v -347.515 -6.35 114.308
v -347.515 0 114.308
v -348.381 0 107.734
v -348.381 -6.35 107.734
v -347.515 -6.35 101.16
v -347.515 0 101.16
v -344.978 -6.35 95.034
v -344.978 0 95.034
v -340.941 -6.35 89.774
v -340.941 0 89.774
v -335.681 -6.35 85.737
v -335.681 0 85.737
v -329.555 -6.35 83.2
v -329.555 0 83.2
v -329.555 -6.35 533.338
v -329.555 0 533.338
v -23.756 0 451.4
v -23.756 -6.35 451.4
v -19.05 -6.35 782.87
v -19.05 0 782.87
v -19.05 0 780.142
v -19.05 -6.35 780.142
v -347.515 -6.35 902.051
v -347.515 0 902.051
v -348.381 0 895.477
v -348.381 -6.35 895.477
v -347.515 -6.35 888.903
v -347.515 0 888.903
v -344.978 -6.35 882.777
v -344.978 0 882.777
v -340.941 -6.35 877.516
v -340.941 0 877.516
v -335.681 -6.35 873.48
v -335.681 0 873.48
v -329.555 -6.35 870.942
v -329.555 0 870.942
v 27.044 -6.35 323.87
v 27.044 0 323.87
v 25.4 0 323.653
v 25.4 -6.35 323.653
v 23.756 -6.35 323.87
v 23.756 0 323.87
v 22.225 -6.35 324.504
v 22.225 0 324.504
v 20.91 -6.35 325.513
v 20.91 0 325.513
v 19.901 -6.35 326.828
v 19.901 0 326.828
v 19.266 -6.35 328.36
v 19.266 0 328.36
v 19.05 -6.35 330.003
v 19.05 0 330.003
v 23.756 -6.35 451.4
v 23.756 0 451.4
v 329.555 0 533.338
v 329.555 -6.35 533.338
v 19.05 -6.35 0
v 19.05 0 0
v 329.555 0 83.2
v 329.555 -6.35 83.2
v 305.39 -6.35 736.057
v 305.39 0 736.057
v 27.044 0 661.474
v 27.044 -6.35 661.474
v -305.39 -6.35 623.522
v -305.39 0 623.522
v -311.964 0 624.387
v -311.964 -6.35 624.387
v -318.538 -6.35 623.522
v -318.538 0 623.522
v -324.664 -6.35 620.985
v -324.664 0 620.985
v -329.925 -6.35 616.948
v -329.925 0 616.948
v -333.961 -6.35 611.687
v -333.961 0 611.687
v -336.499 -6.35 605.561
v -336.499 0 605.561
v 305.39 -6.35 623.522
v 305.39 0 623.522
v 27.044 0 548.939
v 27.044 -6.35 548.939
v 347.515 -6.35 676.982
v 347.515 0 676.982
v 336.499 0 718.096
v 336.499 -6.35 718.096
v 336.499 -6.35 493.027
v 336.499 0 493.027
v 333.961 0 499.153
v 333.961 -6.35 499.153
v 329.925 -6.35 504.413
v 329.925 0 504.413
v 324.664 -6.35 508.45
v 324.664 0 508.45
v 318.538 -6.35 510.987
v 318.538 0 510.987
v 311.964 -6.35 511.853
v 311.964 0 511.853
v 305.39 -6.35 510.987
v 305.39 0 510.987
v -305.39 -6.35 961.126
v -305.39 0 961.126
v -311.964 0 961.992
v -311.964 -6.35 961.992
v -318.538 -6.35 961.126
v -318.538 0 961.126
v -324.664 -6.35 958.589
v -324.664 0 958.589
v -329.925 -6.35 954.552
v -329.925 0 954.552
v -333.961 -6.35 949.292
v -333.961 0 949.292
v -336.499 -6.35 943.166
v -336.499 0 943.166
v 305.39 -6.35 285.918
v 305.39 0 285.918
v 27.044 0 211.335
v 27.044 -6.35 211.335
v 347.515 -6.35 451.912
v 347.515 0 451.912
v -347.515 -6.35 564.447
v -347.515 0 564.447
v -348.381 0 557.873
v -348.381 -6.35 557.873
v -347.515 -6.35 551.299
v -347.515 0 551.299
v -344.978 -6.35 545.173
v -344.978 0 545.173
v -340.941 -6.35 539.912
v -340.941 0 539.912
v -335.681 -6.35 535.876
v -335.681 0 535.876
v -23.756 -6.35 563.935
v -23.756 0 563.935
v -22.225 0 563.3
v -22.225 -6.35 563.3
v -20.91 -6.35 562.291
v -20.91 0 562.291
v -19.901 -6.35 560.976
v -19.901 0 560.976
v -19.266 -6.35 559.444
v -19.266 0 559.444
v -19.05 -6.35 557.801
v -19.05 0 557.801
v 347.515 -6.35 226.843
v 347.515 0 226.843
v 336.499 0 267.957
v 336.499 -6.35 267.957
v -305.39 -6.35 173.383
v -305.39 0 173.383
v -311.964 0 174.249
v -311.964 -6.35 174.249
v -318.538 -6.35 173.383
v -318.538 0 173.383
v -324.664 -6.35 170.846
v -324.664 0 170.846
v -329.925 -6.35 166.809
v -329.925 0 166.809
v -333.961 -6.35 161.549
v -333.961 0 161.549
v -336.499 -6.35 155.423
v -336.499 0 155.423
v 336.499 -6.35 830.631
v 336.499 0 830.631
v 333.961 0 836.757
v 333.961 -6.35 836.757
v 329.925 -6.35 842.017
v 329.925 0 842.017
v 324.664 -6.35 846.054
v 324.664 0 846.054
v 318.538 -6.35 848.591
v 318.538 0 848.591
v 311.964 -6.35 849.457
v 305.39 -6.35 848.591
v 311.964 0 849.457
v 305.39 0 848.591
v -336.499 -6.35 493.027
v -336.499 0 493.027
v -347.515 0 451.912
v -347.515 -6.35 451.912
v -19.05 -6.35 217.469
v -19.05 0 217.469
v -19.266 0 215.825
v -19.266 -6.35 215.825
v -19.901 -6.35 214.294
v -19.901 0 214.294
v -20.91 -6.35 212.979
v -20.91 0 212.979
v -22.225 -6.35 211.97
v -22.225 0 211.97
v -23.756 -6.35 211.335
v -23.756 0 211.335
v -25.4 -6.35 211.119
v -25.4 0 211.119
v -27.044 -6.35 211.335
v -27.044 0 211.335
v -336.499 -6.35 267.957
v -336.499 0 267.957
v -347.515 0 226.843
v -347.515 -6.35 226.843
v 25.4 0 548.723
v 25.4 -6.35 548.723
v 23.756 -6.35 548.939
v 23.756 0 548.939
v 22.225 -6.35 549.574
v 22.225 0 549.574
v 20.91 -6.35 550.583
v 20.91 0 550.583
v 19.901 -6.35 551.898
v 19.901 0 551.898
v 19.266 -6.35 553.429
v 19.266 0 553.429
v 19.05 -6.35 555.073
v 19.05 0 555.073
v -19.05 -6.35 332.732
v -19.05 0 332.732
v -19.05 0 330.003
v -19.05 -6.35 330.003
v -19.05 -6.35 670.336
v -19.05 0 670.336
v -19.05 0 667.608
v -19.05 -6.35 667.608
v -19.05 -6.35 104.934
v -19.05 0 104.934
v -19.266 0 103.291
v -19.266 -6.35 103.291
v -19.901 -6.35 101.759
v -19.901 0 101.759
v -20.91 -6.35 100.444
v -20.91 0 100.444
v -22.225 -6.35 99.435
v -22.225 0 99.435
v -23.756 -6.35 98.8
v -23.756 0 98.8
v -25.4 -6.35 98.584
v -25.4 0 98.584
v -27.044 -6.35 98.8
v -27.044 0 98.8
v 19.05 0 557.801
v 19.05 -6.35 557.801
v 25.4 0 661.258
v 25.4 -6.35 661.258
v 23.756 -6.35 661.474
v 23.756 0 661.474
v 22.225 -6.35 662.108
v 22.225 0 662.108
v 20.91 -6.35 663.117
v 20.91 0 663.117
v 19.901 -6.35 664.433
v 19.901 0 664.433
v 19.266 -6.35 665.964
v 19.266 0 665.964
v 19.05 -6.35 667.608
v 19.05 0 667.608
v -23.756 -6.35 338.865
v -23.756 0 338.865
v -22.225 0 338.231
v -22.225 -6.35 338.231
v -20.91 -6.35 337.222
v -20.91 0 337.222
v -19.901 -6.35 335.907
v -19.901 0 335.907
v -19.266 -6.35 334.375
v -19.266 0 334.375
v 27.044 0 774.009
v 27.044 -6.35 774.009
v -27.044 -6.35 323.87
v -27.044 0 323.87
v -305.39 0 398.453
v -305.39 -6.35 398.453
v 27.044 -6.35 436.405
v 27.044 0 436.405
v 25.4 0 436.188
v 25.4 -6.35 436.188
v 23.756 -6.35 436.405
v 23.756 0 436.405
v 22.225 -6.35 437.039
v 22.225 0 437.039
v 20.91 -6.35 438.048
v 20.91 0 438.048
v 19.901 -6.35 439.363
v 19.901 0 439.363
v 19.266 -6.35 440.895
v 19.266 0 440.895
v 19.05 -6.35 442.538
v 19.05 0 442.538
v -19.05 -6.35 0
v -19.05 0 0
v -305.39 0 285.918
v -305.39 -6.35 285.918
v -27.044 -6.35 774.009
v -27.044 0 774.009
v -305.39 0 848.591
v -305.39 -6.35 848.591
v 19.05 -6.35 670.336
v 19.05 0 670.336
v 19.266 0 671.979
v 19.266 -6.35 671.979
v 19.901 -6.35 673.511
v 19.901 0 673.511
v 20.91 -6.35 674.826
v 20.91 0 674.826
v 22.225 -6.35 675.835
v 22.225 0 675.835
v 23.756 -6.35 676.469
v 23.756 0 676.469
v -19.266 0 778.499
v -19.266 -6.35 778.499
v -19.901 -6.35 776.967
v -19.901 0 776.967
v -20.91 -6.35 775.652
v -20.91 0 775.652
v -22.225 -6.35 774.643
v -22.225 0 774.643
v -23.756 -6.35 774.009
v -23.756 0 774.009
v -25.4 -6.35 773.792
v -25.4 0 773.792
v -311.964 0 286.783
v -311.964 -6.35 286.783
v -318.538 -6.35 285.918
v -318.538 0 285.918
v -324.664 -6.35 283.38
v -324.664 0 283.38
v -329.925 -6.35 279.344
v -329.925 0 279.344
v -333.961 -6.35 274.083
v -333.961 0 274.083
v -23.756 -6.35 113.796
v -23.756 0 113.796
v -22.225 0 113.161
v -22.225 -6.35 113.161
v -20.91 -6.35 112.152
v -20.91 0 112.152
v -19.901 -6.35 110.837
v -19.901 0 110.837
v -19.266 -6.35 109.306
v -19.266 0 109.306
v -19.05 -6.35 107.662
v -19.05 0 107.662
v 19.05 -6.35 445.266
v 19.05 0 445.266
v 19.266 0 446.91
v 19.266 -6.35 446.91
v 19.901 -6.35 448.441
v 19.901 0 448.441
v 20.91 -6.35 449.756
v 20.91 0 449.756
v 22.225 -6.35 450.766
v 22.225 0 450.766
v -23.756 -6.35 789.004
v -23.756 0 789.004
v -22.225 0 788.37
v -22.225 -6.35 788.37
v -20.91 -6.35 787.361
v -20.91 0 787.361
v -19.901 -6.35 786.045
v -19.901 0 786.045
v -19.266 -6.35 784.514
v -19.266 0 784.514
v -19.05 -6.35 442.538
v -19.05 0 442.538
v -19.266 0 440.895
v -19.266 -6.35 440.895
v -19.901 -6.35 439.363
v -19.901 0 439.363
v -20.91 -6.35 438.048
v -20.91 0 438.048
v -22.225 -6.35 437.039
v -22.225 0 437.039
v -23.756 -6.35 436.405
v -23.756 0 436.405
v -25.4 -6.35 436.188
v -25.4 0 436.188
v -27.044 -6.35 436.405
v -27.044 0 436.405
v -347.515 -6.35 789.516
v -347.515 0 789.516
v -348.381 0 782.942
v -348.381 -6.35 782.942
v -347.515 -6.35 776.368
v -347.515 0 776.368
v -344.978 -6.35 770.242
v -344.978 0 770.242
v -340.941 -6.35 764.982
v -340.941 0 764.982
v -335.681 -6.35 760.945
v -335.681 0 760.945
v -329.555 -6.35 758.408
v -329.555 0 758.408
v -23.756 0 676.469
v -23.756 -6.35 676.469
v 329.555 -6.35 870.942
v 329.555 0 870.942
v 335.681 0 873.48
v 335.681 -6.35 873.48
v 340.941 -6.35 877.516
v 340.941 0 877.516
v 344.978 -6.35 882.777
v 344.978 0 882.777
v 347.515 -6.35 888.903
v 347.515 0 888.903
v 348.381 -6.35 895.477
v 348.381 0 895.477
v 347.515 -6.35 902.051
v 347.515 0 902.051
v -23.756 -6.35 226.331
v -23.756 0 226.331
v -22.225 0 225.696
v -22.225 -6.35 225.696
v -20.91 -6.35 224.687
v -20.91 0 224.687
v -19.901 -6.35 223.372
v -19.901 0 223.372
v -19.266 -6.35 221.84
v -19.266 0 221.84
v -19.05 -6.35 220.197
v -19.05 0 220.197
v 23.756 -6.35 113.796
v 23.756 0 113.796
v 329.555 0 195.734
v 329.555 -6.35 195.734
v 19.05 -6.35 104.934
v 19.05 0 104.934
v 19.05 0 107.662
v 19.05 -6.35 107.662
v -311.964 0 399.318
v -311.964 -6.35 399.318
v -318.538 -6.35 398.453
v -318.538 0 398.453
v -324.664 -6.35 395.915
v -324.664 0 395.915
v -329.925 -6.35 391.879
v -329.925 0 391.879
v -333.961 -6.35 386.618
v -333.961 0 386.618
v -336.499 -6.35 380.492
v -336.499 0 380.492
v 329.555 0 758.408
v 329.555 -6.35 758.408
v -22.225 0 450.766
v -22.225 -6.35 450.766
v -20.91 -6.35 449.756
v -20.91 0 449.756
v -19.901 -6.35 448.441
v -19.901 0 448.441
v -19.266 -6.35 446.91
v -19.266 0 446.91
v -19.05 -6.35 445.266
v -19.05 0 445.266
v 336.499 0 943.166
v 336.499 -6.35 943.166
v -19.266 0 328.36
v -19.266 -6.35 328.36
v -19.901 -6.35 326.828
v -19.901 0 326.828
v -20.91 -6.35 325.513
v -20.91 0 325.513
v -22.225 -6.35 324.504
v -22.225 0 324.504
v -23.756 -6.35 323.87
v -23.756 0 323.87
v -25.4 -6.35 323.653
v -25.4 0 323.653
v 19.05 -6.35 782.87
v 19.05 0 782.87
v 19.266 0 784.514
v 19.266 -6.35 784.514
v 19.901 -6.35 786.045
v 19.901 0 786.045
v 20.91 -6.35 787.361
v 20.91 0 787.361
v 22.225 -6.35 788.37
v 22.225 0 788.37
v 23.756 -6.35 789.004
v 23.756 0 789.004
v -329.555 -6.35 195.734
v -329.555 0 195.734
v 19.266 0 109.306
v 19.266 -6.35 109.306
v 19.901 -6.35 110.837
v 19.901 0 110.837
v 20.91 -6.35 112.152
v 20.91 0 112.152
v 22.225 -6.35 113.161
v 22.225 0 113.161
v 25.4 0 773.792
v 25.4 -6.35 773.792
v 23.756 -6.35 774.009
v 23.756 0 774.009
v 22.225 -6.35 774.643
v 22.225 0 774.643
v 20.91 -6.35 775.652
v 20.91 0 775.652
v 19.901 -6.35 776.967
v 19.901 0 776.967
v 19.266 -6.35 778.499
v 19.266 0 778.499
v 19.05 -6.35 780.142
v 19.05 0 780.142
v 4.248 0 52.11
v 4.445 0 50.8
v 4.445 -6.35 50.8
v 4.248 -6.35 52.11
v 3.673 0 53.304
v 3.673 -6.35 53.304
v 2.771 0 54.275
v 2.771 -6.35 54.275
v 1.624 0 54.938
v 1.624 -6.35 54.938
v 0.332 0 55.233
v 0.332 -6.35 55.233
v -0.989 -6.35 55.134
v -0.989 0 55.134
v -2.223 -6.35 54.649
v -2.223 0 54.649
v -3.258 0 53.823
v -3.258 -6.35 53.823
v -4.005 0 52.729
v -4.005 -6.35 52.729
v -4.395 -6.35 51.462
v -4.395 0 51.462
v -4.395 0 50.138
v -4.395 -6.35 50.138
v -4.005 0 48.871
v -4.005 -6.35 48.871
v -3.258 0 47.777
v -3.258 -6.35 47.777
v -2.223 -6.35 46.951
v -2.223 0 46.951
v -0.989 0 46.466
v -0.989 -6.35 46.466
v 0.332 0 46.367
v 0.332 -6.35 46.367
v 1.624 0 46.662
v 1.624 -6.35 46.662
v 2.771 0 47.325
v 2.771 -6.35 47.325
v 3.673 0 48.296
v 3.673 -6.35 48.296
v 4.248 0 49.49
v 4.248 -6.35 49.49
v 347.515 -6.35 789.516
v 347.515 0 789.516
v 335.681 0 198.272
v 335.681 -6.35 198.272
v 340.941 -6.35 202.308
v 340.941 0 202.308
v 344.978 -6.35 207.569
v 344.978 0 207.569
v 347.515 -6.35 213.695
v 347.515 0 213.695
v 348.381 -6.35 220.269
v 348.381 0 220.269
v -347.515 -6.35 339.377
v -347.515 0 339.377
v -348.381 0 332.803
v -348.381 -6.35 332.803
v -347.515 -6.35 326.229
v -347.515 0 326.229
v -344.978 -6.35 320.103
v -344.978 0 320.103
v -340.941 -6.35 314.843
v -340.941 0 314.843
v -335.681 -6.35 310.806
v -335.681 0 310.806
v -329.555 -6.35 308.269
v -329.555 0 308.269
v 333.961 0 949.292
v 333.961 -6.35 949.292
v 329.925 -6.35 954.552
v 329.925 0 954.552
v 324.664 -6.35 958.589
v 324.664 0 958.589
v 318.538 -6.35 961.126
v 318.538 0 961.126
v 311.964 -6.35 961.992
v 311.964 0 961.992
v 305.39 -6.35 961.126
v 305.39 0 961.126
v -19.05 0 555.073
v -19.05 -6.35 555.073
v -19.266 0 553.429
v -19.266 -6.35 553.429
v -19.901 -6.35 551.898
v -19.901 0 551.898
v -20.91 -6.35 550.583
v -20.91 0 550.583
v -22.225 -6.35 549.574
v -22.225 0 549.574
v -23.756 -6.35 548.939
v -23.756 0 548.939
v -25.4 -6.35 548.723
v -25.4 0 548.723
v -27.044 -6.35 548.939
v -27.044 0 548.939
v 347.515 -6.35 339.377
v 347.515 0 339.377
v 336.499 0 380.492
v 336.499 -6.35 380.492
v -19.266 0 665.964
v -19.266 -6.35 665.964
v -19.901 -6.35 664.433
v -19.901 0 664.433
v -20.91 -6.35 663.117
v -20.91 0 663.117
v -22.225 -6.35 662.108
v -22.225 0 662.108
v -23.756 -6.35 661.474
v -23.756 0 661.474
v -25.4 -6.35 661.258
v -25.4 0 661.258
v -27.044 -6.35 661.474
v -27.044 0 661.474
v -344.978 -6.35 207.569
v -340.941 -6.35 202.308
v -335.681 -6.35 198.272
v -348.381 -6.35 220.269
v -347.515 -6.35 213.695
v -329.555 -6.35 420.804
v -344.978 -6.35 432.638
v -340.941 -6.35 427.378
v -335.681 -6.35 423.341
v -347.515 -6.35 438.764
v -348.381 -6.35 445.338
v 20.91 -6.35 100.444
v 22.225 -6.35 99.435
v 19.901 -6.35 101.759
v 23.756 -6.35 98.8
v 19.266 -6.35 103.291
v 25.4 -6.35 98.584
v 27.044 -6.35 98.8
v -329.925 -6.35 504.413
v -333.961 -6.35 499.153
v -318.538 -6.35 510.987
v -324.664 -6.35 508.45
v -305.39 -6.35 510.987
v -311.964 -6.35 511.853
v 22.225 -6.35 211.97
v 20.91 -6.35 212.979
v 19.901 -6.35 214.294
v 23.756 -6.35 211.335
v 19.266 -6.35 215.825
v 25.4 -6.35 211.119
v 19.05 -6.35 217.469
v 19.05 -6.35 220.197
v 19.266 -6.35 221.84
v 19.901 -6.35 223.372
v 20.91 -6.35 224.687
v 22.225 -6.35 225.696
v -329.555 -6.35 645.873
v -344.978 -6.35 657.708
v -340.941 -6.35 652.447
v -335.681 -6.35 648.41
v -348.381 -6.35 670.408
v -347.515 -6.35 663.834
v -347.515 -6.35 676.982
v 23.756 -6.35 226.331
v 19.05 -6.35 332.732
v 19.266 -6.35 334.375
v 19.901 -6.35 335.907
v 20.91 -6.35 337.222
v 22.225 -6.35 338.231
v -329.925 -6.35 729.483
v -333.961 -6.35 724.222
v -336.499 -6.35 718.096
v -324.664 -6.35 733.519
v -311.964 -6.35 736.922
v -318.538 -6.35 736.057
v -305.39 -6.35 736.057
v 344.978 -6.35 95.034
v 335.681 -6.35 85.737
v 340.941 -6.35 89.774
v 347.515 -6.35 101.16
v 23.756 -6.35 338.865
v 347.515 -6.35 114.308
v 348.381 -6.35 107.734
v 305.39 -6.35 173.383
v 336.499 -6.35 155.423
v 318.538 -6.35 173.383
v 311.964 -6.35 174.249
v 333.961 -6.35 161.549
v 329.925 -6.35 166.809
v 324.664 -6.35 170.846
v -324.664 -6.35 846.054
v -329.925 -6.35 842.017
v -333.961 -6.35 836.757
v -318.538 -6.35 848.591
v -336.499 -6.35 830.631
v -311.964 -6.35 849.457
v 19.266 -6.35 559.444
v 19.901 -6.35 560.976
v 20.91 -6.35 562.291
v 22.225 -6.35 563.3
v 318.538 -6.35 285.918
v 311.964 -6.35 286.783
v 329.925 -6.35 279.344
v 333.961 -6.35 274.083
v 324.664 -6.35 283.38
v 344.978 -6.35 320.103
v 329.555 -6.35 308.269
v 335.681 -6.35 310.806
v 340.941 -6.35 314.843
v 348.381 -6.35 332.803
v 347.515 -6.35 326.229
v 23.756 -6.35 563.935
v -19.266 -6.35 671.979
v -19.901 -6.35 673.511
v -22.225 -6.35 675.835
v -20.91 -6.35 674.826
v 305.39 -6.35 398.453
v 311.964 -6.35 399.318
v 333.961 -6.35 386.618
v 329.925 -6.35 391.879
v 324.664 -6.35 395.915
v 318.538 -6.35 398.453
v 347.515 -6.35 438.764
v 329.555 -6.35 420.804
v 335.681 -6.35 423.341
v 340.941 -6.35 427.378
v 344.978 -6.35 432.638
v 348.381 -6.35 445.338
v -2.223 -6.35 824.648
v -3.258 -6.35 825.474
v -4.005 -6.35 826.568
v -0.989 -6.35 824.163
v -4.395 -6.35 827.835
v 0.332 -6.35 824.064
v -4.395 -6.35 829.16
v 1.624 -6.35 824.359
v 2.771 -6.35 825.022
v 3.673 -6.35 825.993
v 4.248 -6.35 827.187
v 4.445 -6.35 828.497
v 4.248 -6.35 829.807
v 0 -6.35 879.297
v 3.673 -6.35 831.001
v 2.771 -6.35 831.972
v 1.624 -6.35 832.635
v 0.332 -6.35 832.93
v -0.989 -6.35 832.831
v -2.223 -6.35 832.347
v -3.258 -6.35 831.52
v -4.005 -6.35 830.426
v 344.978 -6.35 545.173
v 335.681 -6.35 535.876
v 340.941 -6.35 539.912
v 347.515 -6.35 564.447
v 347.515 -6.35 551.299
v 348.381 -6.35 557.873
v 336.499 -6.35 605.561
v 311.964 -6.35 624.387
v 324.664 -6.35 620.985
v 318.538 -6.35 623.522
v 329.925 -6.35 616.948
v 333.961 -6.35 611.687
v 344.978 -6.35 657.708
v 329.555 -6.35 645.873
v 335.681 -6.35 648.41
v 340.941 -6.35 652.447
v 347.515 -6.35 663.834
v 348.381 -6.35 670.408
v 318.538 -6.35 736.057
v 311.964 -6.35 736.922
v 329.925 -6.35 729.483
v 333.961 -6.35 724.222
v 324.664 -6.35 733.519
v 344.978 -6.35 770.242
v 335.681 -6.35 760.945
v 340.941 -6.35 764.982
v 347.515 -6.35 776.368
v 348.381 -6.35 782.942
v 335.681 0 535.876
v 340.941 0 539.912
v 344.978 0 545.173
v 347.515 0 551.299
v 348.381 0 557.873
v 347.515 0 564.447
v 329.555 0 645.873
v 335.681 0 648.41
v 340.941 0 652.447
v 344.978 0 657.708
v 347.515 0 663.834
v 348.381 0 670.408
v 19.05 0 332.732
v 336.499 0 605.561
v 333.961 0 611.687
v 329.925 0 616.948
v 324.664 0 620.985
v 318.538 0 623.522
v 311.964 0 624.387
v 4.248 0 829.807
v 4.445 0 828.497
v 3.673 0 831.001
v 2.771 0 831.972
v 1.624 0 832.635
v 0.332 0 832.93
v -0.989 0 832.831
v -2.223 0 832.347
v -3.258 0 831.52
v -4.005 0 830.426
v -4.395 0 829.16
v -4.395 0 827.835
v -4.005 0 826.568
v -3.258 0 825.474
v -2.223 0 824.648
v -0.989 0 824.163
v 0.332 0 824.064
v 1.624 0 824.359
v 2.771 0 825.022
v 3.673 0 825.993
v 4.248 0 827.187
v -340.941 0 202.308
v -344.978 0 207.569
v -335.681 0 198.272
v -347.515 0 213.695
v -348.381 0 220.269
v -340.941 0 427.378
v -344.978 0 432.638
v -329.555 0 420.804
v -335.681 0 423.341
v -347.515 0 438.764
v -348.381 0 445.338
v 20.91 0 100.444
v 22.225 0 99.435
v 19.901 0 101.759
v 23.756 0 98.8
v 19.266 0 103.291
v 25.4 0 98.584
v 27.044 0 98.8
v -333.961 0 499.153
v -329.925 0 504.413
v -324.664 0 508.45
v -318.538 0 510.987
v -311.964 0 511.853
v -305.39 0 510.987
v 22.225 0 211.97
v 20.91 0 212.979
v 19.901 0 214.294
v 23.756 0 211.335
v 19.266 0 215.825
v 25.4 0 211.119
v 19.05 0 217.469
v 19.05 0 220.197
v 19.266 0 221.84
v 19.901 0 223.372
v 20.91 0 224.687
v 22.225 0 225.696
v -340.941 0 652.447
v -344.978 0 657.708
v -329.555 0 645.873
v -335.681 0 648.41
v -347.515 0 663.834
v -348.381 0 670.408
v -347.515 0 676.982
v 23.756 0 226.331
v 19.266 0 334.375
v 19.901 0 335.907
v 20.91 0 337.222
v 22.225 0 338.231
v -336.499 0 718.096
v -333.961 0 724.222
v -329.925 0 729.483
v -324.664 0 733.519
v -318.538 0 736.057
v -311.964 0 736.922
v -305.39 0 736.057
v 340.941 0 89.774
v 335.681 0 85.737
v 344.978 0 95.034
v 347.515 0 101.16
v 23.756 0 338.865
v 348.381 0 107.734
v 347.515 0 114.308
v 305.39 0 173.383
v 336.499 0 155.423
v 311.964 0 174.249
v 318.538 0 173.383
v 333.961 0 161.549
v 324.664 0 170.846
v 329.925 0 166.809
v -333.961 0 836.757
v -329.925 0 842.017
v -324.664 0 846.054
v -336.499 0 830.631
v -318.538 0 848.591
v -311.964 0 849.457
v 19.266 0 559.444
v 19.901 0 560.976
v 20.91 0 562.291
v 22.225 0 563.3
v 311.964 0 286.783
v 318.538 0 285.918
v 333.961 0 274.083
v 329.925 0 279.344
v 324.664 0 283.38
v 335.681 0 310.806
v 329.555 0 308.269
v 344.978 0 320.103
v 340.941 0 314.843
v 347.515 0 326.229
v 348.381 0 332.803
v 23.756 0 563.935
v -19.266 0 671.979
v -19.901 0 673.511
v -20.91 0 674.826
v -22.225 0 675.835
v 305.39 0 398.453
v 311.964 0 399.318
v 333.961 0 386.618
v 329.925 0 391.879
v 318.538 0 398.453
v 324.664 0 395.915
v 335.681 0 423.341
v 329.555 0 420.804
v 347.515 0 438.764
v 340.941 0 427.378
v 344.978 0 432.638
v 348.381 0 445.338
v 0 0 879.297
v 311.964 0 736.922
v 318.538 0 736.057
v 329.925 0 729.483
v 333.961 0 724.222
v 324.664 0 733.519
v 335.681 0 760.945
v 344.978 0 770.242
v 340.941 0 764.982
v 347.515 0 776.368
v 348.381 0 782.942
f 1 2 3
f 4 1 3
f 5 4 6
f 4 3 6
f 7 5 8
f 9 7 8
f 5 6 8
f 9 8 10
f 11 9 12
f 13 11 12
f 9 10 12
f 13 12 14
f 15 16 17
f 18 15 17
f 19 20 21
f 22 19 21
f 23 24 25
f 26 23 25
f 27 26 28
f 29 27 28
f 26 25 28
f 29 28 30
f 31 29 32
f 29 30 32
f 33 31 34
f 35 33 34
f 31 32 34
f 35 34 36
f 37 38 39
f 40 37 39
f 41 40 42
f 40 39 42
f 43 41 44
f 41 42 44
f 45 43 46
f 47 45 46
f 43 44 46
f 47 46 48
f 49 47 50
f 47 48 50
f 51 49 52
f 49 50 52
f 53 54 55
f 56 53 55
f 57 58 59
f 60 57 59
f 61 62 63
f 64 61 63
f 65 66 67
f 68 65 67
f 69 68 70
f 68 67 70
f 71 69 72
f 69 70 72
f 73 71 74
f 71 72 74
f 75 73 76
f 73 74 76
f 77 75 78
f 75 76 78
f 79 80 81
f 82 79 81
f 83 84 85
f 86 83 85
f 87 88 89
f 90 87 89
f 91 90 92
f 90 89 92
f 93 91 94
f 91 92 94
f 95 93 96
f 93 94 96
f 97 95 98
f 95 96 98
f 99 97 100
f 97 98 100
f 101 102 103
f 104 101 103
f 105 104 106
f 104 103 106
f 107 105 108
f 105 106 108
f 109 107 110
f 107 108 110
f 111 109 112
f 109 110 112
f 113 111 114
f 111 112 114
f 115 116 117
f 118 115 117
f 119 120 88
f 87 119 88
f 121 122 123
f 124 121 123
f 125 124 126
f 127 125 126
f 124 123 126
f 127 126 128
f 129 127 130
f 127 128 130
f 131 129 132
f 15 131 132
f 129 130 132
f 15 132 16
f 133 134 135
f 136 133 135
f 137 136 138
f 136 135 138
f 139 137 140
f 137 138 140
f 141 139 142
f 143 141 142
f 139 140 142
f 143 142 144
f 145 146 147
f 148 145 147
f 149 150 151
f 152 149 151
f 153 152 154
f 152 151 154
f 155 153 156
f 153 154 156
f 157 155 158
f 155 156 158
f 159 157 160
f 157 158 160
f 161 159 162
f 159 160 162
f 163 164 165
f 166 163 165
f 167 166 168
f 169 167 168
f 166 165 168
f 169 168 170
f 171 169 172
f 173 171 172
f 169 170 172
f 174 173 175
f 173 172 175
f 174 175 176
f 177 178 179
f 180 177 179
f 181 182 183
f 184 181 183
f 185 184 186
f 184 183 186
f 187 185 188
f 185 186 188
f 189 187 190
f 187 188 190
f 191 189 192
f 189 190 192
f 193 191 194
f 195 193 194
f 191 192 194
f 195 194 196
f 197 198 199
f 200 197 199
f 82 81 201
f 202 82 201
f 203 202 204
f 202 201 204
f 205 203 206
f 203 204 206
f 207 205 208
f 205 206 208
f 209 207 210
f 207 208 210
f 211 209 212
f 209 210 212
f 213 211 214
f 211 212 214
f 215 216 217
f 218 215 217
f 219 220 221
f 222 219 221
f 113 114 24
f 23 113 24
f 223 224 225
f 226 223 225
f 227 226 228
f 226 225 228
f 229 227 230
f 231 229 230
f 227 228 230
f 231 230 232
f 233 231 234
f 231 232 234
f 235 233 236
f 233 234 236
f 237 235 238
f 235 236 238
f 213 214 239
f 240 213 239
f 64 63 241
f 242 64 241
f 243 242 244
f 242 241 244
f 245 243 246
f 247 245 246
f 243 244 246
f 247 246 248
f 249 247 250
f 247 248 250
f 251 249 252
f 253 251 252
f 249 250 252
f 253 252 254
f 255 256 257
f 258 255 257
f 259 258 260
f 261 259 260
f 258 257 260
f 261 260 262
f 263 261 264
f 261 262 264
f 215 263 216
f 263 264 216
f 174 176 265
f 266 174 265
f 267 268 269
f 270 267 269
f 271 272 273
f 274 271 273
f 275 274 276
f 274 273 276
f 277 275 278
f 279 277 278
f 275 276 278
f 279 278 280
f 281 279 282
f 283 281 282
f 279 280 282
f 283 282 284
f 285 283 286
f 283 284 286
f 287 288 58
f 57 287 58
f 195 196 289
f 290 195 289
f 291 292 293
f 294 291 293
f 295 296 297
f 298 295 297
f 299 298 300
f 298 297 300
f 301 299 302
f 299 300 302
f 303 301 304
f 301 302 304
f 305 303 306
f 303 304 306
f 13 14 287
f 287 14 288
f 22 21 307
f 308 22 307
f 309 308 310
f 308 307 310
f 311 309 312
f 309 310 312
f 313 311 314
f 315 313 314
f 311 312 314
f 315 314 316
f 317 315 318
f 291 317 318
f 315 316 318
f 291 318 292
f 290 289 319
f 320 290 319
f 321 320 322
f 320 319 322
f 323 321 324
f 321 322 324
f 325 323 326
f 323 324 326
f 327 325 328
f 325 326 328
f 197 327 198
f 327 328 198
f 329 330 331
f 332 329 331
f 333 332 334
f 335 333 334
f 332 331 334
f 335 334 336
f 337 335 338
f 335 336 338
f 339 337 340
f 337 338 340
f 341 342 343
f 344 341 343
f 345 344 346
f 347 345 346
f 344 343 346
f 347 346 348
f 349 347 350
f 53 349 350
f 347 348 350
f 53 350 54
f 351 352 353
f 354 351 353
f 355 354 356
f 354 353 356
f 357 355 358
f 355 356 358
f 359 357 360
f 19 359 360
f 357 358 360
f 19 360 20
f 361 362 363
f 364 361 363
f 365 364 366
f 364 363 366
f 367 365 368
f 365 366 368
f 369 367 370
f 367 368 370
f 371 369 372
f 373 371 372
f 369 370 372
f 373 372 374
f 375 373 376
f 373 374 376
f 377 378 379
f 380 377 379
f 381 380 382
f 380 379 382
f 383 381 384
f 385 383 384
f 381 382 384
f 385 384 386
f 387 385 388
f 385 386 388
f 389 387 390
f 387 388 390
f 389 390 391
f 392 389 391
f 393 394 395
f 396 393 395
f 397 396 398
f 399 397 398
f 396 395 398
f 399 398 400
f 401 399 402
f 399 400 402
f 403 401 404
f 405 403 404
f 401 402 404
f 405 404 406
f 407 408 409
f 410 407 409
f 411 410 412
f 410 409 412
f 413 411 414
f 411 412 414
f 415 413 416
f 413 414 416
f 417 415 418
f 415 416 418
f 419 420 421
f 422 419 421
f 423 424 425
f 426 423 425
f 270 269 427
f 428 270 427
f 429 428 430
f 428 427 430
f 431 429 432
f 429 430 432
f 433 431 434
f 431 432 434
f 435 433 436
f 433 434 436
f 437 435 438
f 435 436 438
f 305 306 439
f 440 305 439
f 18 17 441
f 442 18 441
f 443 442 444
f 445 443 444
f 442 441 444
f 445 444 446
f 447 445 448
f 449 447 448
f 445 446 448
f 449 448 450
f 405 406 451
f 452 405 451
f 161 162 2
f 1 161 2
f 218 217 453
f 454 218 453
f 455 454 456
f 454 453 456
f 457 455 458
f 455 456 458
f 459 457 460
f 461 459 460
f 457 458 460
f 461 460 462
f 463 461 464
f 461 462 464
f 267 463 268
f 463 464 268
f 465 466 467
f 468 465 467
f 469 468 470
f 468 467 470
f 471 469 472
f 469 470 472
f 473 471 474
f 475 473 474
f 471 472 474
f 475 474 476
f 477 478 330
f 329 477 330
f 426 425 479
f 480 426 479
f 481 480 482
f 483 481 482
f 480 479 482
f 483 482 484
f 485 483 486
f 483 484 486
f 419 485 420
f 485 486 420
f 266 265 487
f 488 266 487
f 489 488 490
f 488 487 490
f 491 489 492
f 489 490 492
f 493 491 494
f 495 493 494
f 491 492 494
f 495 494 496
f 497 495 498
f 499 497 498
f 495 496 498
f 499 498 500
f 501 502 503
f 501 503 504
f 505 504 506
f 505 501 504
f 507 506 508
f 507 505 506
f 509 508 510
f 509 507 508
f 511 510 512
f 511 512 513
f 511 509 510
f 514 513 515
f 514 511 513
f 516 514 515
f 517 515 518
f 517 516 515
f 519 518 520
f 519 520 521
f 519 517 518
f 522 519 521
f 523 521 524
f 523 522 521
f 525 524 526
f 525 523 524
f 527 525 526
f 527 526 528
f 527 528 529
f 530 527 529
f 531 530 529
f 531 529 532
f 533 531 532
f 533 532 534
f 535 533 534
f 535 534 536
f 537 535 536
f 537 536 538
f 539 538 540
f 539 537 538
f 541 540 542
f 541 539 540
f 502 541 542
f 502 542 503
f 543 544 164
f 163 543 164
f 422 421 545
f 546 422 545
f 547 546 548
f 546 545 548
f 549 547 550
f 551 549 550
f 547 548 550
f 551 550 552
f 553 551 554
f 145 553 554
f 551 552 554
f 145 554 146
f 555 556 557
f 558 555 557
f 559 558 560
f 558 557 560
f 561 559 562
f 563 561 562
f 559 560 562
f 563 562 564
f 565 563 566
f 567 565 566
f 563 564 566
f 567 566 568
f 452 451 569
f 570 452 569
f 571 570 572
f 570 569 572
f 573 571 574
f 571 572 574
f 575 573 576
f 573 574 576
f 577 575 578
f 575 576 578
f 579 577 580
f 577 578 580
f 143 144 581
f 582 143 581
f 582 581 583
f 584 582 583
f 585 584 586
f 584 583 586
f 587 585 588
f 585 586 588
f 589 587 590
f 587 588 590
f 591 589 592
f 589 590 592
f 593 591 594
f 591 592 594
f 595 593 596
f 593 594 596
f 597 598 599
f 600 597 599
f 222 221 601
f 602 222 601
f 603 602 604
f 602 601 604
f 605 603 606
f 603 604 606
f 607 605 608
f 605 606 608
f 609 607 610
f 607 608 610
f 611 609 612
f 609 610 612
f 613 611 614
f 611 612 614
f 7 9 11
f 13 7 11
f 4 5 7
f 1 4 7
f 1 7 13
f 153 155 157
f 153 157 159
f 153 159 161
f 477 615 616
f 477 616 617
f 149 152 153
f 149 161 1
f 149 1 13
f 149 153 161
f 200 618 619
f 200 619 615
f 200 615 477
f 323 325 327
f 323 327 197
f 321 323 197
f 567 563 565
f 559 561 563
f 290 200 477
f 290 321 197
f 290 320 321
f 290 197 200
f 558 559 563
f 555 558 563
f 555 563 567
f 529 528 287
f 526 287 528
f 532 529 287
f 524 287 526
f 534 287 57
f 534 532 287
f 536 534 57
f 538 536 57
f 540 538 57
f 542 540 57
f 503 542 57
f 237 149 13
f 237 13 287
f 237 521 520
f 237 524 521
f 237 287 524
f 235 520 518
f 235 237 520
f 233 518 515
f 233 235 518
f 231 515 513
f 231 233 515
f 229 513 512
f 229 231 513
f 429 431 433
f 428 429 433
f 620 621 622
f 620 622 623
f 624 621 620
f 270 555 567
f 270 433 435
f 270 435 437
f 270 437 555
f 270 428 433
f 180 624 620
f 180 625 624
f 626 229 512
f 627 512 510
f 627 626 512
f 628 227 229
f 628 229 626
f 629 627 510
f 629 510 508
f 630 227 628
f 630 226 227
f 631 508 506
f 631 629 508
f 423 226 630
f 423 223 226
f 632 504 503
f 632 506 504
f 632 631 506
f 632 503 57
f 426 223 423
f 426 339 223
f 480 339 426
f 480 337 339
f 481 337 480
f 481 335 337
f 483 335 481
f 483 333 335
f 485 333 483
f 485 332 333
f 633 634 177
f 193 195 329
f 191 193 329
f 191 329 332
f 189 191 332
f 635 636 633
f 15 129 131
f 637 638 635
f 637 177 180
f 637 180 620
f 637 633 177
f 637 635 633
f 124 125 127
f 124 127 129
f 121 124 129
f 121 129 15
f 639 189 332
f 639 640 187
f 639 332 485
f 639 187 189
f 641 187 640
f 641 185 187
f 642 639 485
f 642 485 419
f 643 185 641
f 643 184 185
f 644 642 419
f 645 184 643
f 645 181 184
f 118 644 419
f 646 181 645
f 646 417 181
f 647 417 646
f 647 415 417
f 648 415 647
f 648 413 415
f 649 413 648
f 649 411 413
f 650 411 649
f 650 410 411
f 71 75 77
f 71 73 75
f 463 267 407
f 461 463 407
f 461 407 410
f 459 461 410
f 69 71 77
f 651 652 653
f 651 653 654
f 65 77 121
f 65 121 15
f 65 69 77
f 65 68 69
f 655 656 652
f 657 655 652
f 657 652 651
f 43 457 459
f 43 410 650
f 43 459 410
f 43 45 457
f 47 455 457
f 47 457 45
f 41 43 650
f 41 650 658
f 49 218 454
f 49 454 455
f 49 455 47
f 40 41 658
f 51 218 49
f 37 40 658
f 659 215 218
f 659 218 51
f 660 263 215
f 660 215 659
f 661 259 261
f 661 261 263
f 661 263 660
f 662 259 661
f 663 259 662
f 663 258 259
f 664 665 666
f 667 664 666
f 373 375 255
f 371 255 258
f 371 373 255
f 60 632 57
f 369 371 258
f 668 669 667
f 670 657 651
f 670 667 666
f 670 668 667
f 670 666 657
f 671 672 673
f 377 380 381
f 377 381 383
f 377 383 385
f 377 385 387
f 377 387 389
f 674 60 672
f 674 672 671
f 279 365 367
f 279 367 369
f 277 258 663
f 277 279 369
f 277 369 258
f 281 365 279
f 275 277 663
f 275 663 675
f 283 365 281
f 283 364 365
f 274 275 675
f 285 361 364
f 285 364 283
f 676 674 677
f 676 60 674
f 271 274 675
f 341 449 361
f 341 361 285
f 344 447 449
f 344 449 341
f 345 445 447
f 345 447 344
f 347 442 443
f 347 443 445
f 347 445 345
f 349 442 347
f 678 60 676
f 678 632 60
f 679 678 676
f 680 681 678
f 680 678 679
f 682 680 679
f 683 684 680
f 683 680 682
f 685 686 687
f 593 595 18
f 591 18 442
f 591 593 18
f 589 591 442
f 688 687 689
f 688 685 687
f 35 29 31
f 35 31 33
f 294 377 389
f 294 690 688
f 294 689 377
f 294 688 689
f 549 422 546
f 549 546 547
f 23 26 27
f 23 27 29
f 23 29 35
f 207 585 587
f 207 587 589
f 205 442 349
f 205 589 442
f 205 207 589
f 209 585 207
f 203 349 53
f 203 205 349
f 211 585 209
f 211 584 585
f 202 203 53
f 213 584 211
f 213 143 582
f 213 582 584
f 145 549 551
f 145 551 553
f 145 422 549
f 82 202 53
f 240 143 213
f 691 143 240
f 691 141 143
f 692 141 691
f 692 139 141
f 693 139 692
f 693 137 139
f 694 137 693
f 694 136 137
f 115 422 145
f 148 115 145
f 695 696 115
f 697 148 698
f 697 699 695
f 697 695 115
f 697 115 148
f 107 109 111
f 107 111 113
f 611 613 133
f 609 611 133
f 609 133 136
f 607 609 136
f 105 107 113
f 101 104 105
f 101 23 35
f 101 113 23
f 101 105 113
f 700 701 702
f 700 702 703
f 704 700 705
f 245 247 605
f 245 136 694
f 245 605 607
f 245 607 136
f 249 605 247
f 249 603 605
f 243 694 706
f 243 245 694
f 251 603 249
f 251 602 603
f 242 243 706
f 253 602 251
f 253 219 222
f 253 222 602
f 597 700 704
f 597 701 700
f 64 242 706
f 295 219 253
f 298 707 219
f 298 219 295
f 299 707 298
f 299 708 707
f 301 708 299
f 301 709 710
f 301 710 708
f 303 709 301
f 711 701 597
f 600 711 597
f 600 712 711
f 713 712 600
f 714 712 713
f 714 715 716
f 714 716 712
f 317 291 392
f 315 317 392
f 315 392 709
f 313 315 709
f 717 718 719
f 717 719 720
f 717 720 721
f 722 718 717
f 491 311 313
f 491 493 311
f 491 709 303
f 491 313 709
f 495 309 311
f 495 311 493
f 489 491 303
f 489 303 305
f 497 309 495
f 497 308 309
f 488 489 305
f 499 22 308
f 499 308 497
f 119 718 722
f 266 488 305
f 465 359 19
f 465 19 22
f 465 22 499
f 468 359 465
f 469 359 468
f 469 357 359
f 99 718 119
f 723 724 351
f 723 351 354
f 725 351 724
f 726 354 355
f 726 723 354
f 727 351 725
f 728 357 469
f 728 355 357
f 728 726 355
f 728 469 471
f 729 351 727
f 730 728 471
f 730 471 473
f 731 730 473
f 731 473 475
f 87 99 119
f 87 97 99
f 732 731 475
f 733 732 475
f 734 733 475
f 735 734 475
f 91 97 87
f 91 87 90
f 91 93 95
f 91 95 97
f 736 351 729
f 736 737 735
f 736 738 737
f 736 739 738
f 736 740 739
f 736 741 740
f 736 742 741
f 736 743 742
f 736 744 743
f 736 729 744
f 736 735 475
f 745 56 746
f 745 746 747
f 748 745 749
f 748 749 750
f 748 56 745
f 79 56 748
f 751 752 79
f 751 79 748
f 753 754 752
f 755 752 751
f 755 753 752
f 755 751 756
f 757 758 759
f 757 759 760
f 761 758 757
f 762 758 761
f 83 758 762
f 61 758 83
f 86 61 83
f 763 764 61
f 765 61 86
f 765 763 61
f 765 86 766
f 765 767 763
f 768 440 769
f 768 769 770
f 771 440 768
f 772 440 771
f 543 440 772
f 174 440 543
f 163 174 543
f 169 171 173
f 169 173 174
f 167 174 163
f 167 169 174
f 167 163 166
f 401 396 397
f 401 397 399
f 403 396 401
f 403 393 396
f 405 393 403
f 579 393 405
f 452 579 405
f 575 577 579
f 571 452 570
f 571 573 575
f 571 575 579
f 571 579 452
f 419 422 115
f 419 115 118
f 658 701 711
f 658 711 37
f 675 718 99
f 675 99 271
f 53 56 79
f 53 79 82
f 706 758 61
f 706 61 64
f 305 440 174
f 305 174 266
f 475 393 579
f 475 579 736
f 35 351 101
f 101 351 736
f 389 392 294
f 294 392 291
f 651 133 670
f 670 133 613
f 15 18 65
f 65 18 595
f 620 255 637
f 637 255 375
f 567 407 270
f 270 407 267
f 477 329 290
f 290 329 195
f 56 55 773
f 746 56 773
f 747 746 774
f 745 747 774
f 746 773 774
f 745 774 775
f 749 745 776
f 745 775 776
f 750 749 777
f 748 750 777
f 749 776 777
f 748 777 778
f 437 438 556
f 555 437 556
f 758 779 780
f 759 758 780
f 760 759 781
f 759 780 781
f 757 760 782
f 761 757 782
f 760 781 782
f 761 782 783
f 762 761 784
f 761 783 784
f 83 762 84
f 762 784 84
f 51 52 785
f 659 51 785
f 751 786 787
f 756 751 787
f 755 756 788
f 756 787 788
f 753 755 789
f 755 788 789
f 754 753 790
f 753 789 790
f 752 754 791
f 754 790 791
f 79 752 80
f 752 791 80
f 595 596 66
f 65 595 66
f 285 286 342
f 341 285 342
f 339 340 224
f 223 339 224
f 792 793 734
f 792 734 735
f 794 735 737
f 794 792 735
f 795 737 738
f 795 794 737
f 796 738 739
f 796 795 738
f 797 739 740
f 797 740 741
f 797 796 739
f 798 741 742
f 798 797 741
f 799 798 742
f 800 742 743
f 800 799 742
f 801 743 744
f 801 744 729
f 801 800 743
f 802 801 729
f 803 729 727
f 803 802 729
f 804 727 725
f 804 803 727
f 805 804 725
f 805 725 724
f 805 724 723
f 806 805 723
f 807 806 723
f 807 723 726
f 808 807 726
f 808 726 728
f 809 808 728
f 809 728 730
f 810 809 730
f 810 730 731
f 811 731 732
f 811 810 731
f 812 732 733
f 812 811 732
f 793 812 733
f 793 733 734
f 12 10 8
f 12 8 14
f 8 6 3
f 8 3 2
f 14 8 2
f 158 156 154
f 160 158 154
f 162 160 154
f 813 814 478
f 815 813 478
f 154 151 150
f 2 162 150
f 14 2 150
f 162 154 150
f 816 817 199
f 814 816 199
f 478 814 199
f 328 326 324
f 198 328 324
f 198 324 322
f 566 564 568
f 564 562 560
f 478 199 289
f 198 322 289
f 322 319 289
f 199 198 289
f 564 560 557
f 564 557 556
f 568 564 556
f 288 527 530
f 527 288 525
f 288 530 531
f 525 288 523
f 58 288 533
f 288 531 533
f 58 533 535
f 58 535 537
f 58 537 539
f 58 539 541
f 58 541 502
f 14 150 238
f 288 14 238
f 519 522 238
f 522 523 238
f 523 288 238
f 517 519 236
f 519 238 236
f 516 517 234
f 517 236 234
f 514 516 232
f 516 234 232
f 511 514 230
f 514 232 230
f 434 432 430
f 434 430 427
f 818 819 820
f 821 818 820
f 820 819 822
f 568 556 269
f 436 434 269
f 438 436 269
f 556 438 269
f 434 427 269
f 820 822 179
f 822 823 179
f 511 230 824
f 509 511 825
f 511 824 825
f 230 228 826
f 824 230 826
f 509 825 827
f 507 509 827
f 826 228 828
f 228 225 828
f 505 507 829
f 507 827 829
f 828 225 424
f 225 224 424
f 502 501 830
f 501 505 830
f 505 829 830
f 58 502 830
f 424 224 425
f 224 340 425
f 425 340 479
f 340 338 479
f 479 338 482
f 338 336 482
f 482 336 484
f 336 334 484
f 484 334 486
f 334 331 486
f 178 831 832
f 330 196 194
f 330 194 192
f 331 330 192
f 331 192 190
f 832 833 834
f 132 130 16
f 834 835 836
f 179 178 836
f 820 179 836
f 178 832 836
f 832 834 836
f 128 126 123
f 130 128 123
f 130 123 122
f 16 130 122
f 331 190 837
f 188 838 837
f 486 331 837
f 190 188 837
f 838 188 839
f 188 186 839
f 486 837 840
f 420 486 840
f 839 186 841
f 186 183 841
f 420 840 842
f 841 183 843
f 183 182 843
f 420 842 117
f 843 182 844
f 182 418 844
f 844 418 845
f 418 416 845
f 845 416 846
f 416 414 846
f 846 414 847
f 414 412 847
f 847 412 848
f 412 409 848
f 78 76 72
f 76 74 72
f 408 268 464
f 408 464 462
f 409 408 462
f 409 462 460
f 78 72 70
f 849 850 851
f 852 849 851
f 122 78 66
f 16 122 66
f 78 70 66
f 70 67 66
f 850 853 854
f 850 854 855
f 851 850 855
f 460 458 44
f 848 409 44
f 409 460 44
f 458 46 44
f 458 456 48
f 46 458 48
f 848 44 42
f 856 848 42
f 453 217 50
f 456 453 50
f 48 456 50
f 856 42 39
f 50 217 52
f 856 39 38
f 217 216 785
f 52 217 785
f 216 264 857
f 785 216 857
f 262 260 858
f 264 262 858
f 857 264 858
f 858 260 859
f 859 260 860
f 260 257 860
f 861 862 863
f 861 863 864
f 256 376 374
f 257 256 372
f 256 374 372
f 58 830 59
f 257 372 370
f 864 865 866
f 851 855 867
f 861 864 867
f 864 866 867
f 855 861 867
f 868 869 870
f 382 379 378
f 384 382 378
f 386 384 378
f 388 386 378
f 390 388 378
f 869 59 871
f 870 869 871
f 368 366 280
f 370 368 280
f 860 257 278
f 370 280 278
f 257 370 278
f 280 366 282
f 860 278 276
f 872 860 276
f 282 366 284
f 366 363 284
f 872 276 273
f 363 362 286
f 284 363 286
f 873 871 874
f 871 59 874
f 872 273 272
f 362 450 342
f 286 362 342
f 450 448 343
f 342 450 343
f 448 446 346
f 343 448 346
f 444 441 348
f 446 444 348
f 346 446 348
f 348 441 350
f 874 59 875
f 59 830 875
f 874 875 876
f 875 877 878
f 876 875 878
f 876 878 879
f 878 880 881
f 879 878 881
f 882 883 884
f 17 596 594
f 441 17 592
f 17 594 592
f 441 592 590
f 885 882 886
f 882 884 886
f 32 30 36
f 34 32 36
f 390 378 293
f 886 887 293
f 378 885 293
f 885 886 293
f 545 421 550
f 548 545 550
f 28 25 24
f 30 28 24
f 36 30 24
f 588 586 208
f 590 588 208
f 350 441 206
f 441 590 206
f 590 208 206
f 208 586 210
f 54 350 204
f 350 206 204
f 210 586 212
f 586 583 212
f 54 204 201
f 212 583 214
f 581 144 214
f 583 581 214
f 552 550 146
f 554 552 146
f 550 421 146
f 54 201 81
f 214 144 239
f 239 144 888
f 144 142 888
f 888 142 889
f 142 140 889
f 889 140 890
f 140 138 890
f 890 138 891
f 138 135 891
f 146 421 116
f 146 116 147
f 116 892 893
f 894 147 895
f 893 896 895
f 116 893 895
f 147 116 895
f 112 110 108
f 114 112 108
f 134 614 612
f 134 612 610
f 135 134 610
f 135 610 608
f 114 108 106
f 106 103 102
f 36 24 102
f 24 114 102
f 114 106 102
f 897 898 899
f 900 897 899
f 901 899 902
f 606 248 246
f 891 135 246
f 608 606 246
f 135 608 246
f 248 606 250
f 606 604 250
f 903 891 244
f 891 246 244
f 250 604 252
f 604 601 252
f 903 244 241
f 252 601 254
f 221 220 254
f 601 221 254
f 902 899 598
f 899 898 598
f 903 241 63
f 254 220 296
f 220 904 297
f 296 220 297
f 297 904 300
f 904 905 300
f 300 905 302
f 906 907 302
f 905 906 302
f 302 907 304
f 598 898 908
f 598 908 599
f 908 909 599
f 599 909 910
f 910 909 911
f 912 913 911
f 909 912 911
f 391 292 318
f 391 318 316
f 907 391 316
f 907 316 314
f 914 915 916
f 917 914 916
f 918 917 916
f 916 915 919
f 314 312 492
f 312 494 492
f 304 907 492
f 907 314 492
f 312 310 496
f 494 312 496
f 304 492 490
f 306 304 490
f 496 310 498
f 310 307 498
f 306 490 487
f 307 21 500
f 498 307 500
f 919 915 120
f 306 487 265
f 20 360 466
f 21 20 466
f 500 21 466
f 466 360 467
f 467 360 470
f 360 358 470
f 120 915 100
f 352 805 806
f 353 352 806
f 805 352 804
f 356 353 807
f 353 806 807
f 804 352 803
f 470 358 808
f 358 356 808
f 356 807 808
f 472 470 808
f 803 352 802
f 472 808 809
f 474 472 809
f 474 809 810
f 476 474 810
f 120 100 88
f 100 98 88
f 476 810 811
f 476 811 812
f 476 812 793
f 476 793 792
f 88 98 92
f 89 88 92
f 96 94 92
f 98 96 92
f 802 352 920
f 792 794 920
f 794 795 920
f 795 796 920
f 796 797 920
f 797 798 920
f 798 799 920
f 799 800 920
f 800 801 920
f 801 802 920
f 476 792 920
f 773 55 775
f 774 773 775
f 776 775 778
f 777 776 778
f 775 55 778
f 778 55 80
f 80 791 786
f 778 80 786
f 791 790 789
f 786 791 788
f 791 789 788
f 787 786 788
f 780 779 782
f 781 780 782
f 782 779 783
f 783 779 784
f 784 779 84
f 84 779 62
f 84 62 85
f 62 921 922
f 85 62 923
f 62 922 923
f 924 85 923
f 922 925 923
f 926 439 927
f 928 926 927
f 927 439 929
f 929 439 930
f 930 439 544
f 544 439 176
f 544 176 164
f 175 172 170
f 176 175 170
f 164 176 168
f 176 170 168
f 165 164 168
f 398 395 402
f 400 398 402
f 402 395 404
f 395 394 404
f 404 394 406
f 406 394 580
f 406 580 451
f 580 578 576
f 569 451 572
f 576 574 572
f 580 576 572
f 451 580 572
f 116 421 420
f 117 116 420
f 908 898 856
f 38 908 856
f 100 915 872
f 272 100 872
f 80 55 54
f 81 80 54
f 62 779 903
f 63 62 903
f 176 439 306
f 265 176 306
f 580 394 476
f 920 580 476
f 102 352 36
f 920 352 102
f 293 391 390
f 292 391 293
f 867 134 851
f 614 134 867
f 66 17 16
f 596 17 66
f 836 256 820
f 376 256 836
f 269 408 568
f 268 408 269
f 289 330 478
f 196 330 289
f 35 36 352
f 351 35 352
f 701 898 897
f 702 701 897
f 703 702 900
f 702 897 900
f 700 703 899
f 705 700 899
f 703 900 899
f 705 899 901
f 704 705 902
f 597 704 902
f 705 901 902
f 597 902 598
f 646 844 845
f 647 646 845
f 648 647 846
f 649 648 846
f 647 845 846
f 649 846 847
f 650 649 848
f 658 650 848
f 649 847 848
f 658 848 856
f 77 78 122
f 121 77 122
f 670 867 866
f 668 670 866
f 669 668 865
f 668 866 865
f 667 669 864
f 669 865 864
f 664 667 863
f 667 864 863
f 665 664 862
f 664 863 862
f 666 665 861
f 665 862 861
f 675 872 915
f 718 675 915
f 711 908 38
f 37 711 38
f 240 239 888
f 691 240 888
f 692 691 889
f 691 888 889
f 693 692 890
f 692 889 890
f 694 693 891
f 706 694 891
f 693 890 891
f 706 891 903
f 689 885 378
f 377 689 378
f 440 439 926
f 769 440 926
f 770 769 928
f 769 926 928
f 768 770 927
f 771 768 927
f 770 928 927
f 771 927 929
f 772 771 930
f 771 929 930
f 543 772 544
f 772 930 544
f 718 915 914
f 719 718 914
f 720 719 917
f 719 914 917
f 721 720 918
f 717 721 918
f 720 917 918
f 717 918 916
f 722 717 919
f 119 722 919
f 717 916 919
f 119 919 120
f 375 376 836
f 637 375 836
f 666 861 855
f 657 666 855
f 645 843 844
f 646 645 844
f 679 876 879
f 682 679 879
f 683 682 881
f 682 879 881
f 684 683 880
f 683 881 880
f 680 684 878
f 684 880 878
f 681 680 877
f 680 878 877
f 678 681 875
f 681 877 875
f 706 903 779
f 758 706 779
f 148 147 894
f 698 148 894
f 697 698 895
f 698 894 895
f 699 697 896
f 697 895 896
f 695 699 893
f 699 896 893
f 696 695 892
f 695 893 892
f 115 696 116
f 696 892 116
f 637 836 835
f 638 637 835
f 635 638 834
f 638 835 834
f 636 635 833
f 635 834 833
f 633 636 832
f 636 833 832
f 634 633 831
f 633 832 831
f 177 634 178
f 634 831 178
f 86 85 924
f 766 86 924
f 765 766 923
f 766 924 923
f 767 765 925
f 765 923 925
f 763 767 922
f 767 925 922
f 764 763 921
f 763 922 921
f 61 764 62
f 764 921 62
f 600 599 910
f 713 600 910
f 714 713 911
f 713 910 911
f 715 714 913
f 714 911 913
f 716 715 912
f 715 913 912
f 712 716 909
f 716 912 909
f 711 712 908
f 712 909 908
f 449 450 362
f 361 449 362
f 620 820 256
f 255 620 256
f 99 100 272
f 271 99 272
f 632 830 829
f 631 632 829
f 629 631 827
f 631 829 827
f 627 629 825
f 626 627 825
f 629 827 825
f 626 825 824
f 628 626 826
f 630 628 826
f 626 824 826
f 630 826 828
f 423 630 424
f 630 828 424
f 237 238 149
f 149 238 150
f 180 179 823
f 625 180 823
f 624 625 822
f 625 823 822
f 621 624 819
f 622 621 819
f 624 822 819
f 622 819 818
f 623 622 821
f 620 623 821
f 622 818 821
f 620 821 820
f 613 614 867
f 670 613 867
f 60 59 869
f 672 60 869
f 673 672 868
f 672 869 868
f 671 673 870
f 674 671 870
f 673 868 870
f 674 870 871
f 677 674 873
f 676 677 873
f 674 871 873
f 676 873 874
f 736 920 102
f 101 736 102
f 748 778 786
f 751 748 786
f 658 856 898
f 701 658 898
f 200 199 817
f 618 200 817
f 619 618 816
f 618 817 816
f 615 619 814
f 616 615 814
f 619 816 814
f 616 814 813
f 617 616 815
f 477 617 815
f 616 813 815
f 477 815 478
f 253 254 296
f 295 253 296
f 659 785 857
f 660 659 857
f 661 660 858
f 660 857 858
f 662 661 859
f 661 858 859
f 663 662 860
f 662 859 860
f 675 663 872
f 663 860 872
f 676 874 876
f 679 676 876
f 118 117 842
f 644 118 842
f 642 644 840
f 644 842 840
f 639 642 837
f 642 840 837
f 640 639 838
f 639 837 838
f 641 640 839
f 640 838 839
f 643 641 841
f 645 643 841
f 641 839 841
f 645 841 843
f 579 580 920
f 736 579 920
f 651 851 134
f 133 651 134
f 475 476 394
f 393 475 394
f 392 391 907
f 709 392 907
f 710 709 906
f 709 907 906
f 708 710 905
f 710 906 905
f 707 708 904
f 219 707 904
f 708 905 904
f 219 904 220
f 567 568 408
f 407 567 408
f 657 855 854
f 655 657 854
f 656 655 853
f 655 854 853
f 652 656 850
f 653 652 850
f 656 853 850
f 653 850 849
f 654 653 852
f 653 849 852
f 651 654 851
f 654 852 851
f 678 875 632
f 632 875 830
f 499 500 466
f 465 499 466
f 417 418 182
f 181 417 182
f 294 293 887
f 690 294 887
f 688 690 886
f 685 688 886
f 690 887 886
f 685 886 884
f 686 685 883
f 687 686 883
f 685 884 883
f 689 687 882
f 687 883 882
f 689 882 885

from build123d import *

# Parameters (mm, degrees)
F0_R     = 4.445
F1_DEPTH = 6.35


with BuildPart() as f1:
    # F0 (on Front) → F1 (new body)
    with BuildSketch(Plane.XZ):
        with BuildLine():
            Line((-19.05, 0), (0, 0))
            Line((0, 0), (19.05, 0))
            Line((19.05, 0), (329.55476, 83.1995))
            ThreePointArc((329.55476, 83.1995), (344.977801, 95.034016), (347.515272, 114.308019))
            Line((347.515272, 114.308019), (336.498634, 155.422674))
            ThreePointArc((336.498634, 155.422674), (324.664118, 170.845716), (305.390114, 173.383186))
            Line((305.390114, 173.383186), (27.043501, 98.800436))
            ThreePointArc((27.043501, 98.800436), (21.534365, 99.896271), (19.05, 104.934065))
            Line((19.05, 104.934065), (19.05, 107.662174))
            ThreePointArc((19.05, 107.662174), (20.362206, 111.527809), (23.756499, 113.795803))
            Line((23.756499, 113.795803), (329.55476, 195.7342))
            ThreePointArc((329.55476, 195.7342), (344.977801, 207.568716), (347.515272, 226.842719))
            Line((347.515272, 226.842719), (336.498634, 267.957374))
            ThreePointArc((336.498634, 267.957374), (324.664118, 283.380416), (305.390114, 285.917886))
            Line((305.390114, 285.917886), (27.043501, 211.335136))
            ThreePointArc((27.043501, 211.335136), (21.534365, 212.430971), (19.05, 217.468765))
            Line((19.05, 217.468765), (19.05, 220.196874))
            ThreePointArc((19.05, 220.196874), (20.362206, 224.062509), (23.756499, 226.330503))
            Line((23.756499, 226.330503), (329.55476, 308.2689))
            ThreePointArc((329.55476, 308.2689), (344.977801, 320.103416), (347.515272, 339.377419))
            Line((347.515272, 339.377419), (336.498634, 380.492074))
            ThreePointArc((336.498634, 380.492074), (324.664118, 395.915116), (305.390114, 398.452586))
            Line((305.390114, 398.452586), (27.043501, 323.869836))
            ThreePointArc((27.043501, 323.869836), (21.534365, 324.965671), (19.05, 330.003465))
            Line((19.05, 330.003465), (19.05, 332.731574))
            ThreePointArc((19.05, 332.731574), (20.362206, 336.597209), (23.756499, 338.865203))
            Line((23.756499, 338.865203), (329.55476, 420.8036))
            ThreePointArc((329.55476, 420.8036), (344.977801, 432.638116), (347.515272, 451.912119))
            Line((347.515272, 451.912119), (336.498634, 493.026774))
            ThreePointArc((336.498634, 493.026774), (324.664118, 508.449816), (305.390114, 510.987286))
            Line((305.390114, 510.987286), (27.043501, 436.404536))
            ThreePointArc((27.043501, 436.404536), (21.534365, 437.500371), (19.05, 442.538165))
            Line((19.05, 442.538165), (19.05, 445.266274))
            ThreePointArc((19.05, 445.266274), (20.362206, 449.131909), (23.756499, 451.399903))
            Line((23.756499, 451.399903), (329.55476, 533.3383))
            ThreePointArc((329.55476, 533.3383), (344.977801, 545.172816), (347.515272, 564.446819))
            Line((347.515272, 564.446819), (336.498634, 605.561474))
            ThreePointArc((336.498634, 605.561474), (324.664118, 620.984516), (305.390114, 623.521986))
            Line((305.390114, 623.521986), (27.043501, 548.939236))
            ThreePointArc((27.043501, 548.939236), (21.534365, 550.035071), (19.05, 555.072865))
            Line((19.05, 555.072865), (19.05, 557.800974))
            ThreePointArc((19.05, 557.800974), (20.362206, 561.666609), (23.756499, 563.934603))
            Line((23.756499, 563.934603), (329.55476, 645.873))
            ThreePointArc((329.55476, 645.873), (344.977801, 657.707516), (347.515272, 676.981519))
            Line((347.515272, 676.981519), (336.498634, 718.096174))
            ThreePointArc((336.498634, 718.096174), (324.664118, 733.519216), (305.390114, 736.056686))
            Line((305.390114, 736.056686), (27.043501, 661.473936))
            ThreePointArc((27.043501, 661.473936), (21.534365, 662.569771), (19.05, 667.607565))
            Line((19.05, 667.607565), (19.05, 670.335674))
            ThreePointArc((19.05, 670.335674), (20.362206, 674.201309), (23.756499, 676.469303))
            Line((23.756499, 676.469303), (329.55476, 758.4077))
            ThreePointArc((329.55476, 758.4077), (344.977801, 770.242216), (347.515272, 789.516219))
            Line((347.515272, 789.516219), (336.498634, 830.630874))
            ThreePointArc((336.498634, 830.630874), (324.664118, 846.053916), (305.390114, 848.591386))
            Line((305.390114, 848.591386), (27.043501, 774.008636))
            ThreePointArc((27.043501, 774.008636), (21.534365, 775.104471), (19.05, 780.142265))
            Line((19.05, 780.142265), (19.05, 782.870374))
            ThreePointArc((19.05, 782.870374), (20.362206, 786.736009), (23.756499, 789.004003))
            Line((23.756499, 789.004003), (329.55476, 870.9424))
            ThreePointArc((329.55476, 870.9424), (344.977801, 882.776916), (347.515272, 902.050919))
            Line((347.515272, 902.050919), (336.498634, 943.165574))
            ThreePointArc((336.498634, 943.165574), (324.664118, 958.588616), (305.390114, 961.126086))
            Line((305.390114, 961.126086), (0, 879.297052))
            Line((0, 879.297052), (-305.390114, 961.126086))
            ThreePointArc((-305.390114, 961.126086), (-324.664118, 958.588616), (-336.498634, 943.165574))
            Line((-336.498634, 943.165574), (-347.515272, 902.050919))
            ThreePointArc((-347.515272, 902.050919), (-344.977801, 882.776916), (-329.55476, 870.9424))
            Line((-329.55476, 870.9424), (-23.756499, 789.004003))
            ThreePointArc((-23.756499, 789.004003), (-20.362206, 786.736009), (-19.05, 782.870374))
            Line((-19.05, 782.870374), (-19.05, 780.142265))
            ThreePointArc((-19.05, 780.142265), (-21.534365, 775.104471), (-27.043501, 774.008636))
            Line((-27.043501, 774.008636), (-305.390114, 848.591386))
            ThreePointArc((-305.390114, 848.591386), (-324.664118, 846.053916), (-336.498634, 830.630874))
            Line((-336.498634, 830.630874), (-347.515272, 789.516219))
            ThreePointArc((-347.515272, 789.516219), (-344.977801, 770.242216), (-329.55476, 758.4077))
            Line((-329.55476, 758.4077), (-23.756499, 676.469303))
            ThreePointArc((-23.756499, 676.469303), (-20.362206, 674.201309), (-19.05, 670.335674))
            Line((-19.05, 670.335674), (-19.05, 667.607565))
            ThreePointArc((-19.05, 667.607565), (-21.534365, 662.569771), (-27.043501, 661.473936))
            Line((-27.043501, 661.473936), (-305.390114, 736.056686))
            ThreePointArc((-305.390114, 736.056686), (-324.664118, 733.519216), (-336.498634, 718.096174))
            Line((-336.498634, 718.096174), (-347.515272, 676.981519))
            ThreePointArc((-347.515272, 676.981519), (-344.977801, 657.707516), (-329.55476, 645.873))
            Line((-329.55476, 645.873), (-23.756499, 563.934603))
            ThreePointArc((-23.756499, 563.934603), (-20.362206, 561.666609), (-19.05, 557.800974))
            Line((-19.05, 557.800974), (-19.05, 555.072865))
            ThreePointArc((-19.05, 555.072865), (-21.534365, 550.035071), (-27.043501, 548.939236))
            Line((-27.043501, 548.939236), (-305.390114, 623.521986))
            ThreePointArc((-305.390114, 623.521986), (-324.664118, 620.984516), (-336.498634, 605.561474))
            Line((-336.498634, 605.561474), (-347.515272, 564.446819))
            ThreePointArc((-347.515272, 564.446819), (-344.977801, 545.172816), (-329.55476, 533.3383))
            Line((-329.55476, 533.3383), (-23.756499, 451.399903))
            ThreePointArc((-23.756499, 451.399903), (-20.362206, 449.131909), (-19.05, 445.266274))
            Line((-19.05, 445.266274), (-19.05, 442.538165))
            ThreePointArc((-19.05, 442.538165), (-21.534365, 437.500371), (-27.043501, 436.404536))
            Line((-27.043501, 436.404536), (-305.390114, 510.987286))
            ThreePointArc((-305.390114, 510.987286), (-324.664118, 508.449816), (-336.498634, 493.026774))
            Line((-336.498634, 493.026774), (-347.515272, 451.912119))
            ThreePointArc((-347.515272, 451.912119), (-344.977801, 432.638116), (-329.55476, 420.8036))
            Line((-329.55476, 420.8036), (-23.756499, 338.865203))
            ThreePointArc((-23.756499, 338.865203), (-20.362206, 336.597209), (-19.05, 332.731574))
            Line((-19.05, 332.731574), (-19.05, 330.003465))
            ThreePointArc((-19.05, 330.003465), (-21.534365, 324.965671), (-27.043501, 323.869836))
            Line((-27.043501, 323.869836), (-305.390114, 398.452586))
            ThreePointArc((-305.390114, 398.452586), (-324.664118, 395.915116), (-336.498634, 380.492074))
            Line((-336.498634, 380.492074), (-347.515272, 339.377419))
            ThreePointArc((-347.515272, 339.377419), (-344.977801, 320.103416), (-329.55476, 308.2689))
            Line((-329.55476, 308.2689), (-23.756499, 226.330503))
            ThreePointArc((-23.756499, 226.330503), (-20.362206, 224.062509), (-19.05, 220.196874))
            Line((-19.05, 220.196874), (-19.05, 217.468765))
            ThreePointArc((-19.05, 217.468765), (-21.534365, 212.430971), (-27.043501, 211.335136))
            Line((-27.043501, 211.335136), (-305.390114, 285.917886))
            ThreePointArc((-305.390114, 285.917886), (-324.664118, 283.380416), (-336.498634, 267.957374))
            Line((-336.498634, 267.957374), (-347.515272, 226.842719))
            ThreePointArc((-347.515272, 226.842719), (-344.977801, 207.568716), (-329.55476, 195.7342))
            Line((-329.55476, 195.7342), (-23.756499, 113.795803))
            ThreePointArc((-23.756499, 113.795803), (-20.362206, 111.527809), (-19.05, 107.662174))
            Line((-19.05, 107.662174), (-19.05, 104.934065))
            ThreePointArc((-19.05, 104.934065), (-21.534365, 99.896271), (-27.043501, 98.800436))
            Line((-27.043501, 98.800436), (-305.390114, 173.383186))
            ThreePointArc((-305.390114, 173.383186), (-324.664118, 170.845716), (-336.498634, 155.422674))
            Line((-336.498634, 155.422674), (-347.515272, 114.308019))
            ThreePointArc((-347.515272, 114.308019), (-344.977801, 95.034016), (-329.55476, 83.1995))
            Line((-329.55476, 83.1995), (-19.05, 0))
        make_face()
        with Locations((0, 50.8)):
            Circle(F0_R, mode=Mode.SUBTRACT)
        with Locations((0, 828.497052)):
            Circle(F0_R, mode=Mode.SUBTRACT)
    extrude(amount=F1_DEPTH)


solid = f1.part
